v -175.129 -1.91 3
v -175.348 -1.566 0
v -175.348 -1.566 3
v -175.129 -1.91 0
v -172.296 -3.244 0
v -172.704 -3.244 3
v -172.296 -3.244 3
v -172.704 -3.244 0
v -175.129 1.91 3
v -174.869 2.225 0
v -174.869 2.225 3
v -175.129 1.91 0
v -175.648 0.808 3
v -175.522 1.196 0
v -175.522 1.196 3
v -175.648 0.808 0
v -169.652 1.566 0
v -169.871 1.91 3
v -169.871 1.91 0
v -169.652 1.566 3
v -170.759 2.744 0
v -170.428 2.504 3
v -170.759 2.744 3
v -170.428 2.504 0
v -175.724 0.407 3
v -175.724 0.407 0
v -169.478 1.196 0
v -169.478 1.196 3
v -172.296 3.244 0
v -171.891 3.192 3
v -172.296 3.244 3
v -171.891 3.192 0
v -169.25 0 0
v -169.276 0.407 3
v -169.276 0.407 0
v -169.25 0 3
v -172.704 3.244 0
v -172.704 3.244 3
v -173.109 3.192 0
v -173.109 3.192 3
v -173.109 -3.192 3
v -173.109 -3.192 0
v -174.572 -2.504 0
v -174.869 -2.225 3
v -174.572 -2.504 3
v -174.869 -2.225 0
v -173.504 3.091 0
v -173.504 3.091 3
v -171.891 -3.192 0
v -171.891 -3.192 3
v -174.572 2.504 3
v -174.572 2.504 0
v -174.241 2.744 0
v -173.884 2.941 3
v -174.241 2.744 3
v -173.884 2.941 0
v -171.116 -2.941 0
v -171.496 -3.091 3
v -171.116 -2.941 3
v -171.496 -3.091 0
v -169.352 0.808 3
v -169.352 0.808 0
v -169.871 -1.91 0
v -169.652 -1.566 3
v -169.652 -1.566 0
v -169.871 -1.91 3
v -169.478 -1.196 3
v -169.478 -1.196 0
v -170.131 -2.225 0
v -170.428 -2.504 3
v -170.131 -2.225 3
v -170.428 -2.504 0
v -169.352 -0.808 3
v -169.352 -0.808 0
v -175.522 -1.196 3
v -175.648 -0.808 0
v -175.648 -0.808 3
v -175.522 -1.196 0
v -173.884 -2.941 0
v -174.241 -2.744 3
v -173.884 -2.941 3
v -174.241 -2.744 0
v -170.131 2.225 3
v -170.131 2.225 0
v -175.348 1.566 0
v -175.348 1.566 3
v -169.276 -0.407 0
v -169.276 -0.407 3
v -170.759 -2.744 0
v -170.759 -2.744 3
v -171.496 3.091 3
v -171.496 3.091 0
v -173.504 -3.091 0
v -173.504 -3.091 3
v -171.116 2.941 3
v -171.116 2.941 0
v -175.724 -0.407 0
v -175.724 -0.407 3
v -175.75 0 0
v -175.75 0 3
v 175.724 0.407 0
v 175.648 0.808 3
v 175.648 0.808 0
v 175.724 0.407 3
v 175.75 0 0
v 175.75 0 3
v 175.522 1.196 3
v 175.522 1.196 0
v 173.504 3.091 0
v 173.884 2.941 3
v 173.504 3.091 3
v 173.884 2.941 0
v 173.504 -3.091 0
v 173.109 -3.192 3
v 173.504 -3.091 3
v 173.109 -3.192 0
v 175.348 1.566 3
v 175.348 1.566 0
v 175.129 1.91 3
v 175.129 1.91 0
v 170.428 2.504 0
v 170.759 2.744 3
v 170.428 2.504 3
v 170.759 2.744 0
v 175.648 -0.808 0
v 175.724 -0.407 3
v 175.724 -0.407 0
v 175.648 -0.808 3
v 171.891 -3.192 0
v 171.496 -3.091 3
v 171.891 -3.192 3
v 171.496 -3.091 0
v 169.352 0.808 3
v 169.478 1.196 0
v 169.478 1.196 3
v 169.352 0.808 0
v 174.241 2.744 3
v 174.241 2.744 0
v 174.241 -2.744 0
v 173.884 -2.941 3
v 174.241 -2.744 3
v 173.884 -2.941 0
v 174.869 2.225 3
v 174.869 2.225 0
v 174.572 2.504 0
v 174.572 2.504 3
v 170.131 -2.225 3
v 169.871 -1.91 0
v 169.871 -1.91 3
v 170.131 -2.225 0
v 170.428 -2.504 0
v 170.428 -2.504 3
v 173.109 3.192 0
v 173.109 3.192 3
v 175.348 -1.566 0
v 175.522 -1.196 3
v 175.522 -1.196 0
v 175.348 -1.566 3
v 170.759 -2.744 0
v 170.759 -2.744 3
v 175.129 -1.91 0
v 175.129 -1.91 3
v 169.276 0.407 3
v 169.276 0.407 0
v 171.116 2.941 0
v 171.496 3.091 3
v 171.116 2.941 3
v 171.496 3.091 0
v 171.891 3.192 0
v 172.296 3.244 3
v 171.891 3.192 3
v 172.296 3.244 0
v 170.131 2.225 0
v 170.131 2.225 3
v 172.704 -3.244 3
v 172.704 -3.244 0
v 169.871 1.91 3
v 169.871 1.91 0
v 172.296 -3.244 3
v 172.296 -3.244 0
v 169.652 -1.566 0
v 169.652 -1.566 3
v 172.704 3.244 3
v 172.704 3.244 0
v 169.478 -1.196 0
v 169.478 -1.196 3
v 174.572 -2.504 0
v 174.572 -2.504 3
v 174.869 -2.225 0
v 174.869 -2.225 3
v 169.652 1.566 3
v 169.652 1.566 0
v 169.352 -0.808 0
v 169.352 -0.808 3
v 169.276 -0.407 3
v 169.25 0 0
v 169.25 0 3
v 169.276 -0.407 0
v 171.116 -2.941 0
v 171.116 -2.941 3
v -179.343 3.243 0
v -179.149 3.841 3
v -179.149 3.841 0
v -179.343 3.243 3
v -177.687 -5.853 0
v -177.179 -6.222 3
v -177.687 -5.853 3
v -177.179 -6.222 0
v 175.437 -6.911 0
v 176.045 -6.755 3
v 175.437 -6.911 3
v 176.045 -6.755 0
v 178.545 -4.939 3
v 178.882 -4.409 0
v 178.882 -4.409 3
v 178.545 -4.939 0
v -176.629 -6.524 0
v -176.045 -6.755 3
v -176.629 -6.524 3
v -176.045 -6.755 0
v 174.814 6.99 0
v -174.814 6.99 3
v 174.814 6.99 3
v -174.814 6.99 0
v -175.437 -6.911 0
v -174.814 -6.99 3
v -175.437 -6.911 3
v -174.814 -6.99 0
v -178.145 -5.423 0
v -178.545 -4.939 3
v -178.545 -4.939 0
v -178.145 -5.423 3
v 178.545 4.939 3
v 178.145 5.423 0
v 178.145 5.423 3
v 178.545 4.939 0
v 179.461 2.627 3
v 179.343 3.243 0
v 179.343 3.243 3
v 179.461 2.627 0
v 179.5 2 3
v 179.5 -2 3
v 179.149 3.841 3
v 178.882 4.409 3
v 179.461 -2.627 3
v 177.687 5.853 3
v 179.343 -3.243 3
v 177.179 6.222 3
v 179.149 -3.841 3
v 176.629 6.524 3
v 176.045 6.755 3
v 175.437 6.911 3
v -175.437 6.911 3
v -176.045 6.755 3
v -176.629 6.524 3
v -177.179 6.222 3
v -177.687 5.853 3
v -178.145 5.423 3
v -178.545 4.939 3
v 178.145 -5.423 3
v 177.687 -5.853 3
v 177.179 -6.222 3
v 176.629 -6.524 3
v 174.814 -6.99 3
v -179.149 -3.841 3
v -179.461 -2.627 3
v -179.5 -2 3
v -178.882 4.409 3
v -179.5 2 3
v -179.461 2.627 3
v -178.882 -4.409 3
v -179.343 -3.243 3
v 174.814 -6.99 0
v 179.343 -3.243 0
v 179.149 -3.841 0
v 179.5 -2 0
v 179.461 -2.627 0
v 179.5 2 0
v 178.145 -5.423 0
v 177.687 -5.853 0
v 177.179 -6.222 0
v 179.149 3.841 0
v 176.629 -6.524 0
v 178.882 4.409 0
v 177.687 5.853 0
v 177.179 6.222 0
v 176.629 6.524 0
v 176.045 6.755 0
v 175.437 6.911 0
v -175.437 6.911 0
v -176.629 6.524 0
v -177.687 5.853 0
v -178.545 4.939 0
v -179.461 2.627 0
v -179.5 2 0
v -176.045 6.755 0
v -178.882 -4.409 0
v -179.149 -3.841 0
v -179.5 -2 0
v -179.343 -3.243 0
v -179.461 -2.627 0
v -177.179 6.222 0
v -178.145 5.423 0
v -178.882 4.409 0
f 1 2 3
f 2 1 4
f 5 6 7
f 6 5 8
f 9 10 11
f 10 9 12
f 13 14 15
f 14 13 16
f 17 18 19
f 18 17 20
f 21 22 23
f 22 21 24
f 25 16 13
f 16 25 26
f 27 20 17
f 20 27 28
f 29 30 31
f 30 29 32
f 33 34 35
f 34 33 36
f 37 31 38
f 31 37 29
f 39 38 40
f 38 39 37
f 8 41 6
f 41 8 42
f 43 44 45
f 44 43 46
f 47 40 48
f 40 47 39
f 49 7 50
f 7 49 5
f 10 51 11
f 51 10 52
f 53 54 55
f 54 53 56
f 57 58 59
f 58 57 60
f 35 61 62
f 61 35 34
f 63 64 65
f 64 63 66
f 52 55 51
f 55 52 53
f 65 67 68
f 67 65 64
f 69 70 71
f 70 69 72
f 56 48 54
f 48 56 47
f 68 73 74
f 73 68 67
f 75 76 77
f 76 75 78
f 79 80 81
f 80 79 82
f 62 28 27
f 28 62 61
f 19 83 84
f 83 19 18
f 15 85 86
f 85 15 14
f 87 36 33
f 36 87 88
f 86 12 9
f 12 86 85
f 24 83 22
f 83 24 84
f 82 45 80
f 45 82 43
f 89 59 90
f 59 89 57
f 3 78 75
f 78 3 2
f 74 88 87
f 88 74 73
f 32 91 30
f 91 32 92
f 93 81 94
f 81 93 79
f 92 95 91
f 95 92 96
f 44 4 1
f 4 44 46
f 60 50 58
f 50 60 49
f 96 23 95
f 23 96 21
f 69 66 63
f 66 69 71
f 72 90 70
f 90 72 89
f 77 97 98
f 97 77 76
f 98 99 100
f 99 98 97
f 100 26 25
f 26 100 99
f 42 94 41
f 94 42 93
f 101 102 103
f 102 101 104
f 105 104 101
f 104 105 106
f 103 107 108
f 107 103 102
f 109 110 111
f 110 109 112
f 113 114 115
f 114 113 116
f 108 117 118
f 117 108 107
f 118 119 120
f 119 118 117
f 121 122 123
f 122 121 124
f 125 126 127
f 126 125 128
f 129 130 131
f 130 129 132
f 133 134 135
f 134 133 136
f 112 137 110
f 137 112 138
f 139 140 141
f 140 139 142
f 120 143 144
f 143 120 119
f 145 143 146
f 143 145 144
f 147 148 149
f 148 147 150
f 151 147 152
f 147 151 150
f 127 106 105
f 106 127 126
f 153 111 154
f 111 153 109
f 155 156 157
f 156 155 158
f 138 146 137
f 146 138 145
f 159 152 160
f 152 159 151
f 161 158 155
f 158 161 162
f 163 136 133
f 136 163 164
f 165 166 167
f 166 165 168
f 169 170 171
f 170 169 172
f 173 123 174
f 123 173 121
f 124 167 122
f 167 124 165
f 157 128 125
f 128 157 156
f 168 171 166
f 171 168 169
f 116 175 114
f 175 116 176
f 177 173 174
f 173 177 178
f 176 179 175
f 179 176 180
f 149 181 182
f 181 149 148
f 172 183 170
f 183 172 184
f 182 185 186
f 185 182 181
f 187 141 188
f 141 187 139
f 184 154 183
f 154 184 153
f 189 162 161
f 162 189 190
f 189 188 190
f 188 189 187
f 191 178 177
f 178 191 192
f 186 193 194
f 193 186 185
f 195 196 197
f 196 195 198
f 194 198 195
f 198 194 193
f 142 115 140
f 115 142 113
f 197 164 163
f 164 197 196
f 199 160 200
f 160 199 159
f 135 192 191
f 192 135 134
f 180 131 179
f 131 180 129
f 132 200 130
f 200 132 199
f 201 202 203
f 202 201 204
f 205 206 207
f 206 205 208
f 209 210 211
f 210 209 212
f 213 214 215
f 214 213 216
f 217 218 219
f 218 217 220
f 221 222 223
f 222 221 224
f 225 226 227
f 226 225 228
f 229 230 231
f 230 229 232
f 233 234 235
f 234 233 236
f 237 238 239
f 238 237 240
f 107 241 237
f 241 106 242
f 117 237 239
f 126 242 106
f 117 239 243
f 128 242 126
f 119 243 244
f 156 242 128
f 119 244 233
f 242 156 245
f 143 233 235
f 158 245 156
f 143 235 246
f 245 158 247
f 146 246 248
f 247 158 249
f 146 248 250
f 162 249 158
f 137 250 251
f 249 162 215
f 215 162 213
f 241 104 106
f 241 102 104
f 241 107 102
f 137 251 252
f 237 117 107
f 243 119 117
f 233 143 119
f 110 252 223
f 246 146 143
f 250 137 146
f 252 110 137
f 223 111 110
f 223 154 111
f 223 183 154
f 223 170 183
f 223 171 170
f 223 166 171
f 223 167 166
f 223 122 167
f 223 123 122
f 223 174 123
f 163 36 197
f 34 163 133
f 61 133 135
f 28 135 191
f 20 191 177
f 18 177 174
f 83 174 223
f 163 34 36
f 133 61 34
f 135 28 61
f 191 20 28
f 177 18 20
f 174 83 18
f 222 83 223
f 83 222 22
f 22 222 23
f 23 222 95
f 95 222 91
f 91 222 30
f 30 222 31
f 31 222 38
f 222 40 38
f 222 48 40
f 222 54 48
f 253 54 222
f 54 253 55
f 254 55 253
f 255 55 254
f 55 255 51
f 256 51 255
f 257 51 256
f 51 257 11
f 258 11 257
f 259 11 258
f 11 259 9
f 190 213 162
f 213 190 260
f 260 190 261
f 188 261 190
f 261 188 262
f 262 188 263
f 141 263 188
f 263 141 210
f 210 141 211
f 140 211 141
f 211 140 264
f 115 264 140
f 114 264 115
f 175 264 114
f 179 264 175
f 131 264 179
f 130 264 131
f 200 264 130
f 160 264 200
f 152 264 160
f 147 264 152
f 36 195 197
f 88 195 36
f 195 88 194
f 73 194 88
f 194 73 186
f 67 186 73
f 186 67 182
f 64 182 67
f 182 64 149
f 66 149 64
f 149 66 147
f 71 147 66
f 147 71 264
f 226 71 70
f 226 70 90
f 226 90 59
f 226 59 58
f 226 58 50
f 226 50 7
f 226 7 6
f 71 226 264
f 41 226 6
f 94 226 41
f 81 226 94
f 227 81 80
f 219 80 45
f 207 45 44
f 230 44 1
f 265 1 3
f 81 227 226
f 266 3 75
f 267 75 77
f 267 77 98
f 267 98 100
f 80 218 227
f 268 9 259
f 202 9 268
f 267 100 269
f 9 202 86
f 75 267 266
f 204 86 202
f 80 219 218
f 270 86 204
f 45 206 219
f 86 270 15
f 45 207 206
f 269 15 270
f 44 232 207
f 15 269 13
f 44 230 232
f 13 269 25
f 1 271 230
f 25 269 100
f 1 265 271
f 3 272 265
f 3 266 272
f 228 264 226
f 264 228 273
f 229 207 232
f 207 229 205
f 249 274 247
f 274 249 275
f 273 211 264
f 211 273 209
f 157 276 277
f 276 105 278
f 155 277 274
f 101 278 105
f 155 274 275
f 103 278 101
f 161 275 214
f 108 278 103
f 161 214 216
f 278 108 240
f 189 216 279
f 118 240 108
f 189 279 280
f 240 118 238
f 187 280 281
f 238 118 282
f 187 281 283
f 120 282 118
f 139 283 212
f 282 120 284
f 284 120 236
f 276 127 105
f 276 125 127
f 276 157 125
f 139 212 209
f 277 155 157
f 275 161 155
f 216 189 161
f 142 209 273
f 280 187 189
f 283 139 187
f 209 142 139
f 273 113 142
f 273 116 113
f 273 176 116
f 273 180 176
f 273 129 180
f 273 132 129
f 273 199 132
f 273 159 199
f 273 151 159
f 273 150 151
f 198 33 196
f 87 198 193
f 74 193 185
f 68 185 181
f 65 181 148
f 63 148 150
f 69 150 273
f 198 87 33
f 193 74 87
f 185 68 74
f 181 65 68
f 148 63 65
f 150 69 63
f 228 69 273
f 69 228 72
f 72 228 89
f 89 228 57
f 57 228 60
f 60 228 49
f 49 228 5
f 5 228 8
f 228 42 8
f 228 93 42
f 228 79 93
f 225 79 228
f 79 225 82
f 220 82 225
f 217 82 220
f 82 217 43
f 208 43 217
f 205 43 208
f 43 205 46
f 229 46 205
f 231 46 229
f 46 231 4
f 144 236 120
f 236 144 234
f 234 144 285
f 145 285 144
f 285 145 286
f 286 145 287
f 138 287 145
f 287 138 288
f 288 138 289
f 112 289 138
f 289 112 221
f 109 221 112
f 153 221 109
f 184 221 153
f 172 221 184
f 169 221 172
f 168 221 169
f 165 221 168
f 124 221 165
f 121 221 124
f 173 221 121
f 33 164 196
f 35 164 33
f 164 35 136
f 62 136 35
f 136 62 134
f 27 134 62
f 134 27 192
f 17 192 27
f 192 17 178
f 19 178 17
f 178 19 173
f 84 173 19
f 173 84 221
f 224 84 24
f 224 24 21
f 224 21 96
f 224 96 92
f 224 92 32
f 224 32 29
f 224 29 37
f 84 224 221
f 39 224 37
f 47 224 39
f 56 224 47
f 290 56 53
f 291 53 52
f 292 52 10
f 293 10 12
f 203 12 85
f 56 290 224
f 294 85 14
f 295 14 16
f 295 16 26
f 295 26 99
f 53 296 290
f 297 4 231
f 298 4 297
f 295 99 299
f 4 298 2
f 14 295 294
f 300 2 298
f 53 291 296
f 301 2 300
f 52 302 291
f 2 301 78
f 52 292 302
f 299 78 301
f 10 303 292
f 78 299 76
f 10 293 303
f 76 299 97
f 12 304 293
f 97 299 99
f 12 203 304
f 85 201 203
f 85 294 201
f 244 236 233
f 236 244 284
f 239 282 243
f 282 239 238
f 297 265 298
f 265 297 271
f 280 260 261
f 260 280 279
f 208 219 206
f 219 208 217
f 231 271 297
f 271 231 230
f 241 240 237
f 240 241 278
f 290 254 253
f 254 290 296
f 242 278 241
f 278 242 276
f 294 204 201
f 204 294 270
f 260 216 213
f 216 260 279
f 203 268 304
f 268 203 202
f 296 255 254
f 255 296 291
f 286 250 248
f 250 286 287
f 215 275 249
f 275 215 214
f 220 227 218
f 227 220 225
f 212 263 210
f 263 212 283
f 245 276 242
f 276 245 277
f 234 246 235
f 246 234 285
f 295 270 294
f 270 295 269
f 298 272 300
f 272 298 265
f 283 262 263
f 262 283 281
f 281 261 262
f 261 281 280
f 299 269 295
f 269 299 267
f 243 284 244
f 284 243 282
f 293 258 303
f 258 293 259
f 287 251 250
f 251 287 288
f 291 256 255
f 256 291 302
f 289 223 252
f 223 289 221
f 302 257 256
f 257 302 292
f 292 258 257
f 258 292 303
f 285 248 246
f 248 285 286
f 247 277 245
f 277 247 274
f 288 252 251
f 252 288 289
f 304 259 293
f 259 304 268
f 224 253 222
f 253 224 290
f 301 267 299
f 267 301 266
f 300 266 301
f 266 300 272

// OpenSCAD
$fn = 50;


difference() {
	union() {
		hull() {
			translate(v = [-174.5000000000, 2.0000000000, 0]) {
				cylinder(h = 3, r = 5);
			}
			translate(v = [174.5000000000, 2.0000000000, 0]) {
				cylinder(h = 3, r = 5);
			}
			translate(v = [-174.5000000000, -2.0000000000, 0]) {
				cylinder(h = 3, r = 5);
			}
			translate(v = [174.5000000000, -2.0000000000, 0]) {
				cylinder(h = 3, r = 5);
			}
		}
	}
	union() {
		translate(v = [-172.5000000000, 0.0000000000, -100.0000000000]) {
			cylinder(h = 200, r = 3.2500000000);
		}
		translate(v = [-172.5000000000, 0.0000000000, -100.0000000000]) {
			cylinder(h = 200, r = 3.2500000000);
		}
		translate(v = [172.5000000000, 0.0000000000, -100.0000000000]) {
			cylinder(h = 200, r = 3.2500000000);
		}
		translate(v = [172.5000000000, 0.0000000000, -100.0000000000]) {
			cylinder(h = 200, r = 3.2500000000);
		}
	}
}
